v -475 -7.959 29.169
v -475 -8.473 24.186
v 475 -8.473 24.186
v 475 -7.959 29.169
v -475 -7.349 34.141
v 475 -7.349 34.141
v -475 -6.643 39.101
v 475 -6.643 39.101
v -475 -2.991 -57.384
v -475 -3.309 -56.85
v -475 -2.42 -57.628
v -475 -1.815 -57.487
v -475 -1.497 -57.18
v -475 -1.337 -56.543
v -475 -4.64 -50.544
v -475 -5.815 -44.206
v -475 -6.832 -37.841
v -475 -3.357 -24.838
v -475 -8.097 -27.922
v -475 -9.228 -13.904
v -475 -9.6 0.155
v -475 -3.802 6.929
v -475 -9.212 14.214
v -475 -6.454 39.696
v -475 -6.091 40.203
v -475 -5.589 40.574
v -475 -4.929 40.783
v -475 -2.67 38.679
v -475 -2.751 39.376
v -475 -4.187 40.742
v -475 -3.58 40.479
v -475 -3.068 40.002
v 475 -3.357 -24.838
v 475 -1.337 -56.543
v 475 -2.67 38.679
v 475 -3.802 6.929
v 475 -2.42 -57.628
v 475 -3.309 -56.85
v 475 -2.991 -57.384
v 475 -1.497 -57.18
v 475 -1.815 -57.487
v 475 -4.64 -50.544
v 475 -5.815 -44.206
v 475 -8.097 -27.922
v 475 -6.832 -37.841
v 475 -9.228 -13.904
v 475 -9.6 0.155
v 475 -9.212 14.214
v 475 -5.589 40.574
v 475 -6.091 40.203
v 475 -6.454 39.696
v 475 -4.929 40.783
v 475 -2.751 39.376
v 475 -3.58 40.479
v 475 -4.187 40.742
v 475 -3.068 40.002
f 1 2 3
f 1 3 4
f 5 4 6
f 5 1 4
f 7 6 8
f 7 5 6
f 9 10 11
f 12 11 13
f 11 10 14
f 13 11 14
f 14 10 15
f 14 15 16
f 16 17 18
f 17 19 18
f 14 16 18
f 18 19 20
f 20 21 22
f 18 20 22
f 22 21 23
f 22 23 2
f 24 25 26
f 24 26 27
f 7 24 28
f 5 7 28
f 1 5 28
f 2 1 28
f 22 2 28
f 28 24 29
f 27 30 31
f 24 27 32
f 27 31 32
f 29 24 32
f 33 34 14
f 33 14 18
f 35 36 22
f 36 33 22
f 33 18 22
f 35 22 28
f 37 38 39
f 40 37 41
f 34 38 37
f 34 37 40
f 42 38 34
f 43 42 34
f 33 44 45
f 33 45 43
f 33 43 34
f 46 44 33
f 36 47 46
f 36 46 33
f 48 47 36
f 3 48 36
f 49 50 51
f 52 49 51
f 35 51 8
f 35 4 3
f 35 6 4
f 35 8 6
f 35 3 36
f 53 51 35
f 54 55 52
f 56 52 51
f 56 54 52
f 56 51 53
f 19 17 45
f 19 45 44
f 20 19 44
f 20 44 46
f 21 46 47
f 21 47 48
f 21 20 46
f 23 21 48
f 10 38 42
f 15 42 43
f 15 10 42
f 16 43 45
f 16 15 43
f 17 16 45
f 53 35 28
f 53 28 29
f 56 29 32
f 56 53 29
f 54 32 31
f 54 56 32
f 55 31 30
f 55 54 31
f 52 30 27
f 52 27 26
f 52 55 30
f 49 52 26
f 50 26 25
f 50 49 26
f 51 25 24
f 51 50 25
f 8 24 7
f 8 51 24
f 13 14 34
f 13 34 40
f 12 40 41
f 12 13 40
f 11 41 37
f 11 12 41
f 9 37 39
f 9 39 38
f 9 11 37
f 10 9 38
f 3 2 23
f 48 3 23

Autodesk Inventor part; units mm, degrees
ref_plane "YZ Plane" through (0, 0, 0) normal (1, 0, 0) x (0, 1, 0)
ref_plane "XZ Plane" through (0, 0, 0) normal (0, 1, 0) x (-1, 0, 0)
ref_plane "XY Plane" through (0, 0, 0) normal (0, 0, 1) x (1, 0, 0)
sketch "スケッチ1" plane through (0, 0, 0) normal (1, 0, 0) x (0, 1, 0)
  line L0 (0, 70) -> (0, -70)
  arc A0 (0, 70) -> (0, -70) centre (636.1604, 0) ccw
  arc A1 (0, 70) -> (0, -70) centre (250.3997, 0) ccw
  line L1 (-138.7525, 0) -> (765.3125, 0) projected
  point P0 (0, 0)
  point P1 (0, 0)
  dimension "d2" = 140
  dimension "d3" = 640
  dimension "d4" = 260
extrude "押し出し1" add sketch "スケッチ1" along normal mid plane 950 contours A0 L1 A1 | A0 A1 L1
fillet "フィレット1" radius 2 1 edges at (0, 0, 70)
fillet "フィレット2" radius 1 1 edges at (0, 0, -70)
sketch "スケッチ2" plane through (475, 0, 0) normal (1, 0, 0) x (0, 0, -1)
  line L0 (-24.1862, -8.4729) -> (-14.2135, -9.2115)
  line L1 (37.8412, -6.8318) -> (27.9216, -8.0967)
  arc A0 (-39.1008, -6.6434) -> (56.8505, -3.3089) centre (0, 250.3997) ccw projected
  point P0 (0, 0)
  dimension "d7" = 10
  dimension "d8" = 10
extrude "押し出し2" cut sketch "スケッチ2" against normal through all
properties part number "element_2" material "CFRP"
